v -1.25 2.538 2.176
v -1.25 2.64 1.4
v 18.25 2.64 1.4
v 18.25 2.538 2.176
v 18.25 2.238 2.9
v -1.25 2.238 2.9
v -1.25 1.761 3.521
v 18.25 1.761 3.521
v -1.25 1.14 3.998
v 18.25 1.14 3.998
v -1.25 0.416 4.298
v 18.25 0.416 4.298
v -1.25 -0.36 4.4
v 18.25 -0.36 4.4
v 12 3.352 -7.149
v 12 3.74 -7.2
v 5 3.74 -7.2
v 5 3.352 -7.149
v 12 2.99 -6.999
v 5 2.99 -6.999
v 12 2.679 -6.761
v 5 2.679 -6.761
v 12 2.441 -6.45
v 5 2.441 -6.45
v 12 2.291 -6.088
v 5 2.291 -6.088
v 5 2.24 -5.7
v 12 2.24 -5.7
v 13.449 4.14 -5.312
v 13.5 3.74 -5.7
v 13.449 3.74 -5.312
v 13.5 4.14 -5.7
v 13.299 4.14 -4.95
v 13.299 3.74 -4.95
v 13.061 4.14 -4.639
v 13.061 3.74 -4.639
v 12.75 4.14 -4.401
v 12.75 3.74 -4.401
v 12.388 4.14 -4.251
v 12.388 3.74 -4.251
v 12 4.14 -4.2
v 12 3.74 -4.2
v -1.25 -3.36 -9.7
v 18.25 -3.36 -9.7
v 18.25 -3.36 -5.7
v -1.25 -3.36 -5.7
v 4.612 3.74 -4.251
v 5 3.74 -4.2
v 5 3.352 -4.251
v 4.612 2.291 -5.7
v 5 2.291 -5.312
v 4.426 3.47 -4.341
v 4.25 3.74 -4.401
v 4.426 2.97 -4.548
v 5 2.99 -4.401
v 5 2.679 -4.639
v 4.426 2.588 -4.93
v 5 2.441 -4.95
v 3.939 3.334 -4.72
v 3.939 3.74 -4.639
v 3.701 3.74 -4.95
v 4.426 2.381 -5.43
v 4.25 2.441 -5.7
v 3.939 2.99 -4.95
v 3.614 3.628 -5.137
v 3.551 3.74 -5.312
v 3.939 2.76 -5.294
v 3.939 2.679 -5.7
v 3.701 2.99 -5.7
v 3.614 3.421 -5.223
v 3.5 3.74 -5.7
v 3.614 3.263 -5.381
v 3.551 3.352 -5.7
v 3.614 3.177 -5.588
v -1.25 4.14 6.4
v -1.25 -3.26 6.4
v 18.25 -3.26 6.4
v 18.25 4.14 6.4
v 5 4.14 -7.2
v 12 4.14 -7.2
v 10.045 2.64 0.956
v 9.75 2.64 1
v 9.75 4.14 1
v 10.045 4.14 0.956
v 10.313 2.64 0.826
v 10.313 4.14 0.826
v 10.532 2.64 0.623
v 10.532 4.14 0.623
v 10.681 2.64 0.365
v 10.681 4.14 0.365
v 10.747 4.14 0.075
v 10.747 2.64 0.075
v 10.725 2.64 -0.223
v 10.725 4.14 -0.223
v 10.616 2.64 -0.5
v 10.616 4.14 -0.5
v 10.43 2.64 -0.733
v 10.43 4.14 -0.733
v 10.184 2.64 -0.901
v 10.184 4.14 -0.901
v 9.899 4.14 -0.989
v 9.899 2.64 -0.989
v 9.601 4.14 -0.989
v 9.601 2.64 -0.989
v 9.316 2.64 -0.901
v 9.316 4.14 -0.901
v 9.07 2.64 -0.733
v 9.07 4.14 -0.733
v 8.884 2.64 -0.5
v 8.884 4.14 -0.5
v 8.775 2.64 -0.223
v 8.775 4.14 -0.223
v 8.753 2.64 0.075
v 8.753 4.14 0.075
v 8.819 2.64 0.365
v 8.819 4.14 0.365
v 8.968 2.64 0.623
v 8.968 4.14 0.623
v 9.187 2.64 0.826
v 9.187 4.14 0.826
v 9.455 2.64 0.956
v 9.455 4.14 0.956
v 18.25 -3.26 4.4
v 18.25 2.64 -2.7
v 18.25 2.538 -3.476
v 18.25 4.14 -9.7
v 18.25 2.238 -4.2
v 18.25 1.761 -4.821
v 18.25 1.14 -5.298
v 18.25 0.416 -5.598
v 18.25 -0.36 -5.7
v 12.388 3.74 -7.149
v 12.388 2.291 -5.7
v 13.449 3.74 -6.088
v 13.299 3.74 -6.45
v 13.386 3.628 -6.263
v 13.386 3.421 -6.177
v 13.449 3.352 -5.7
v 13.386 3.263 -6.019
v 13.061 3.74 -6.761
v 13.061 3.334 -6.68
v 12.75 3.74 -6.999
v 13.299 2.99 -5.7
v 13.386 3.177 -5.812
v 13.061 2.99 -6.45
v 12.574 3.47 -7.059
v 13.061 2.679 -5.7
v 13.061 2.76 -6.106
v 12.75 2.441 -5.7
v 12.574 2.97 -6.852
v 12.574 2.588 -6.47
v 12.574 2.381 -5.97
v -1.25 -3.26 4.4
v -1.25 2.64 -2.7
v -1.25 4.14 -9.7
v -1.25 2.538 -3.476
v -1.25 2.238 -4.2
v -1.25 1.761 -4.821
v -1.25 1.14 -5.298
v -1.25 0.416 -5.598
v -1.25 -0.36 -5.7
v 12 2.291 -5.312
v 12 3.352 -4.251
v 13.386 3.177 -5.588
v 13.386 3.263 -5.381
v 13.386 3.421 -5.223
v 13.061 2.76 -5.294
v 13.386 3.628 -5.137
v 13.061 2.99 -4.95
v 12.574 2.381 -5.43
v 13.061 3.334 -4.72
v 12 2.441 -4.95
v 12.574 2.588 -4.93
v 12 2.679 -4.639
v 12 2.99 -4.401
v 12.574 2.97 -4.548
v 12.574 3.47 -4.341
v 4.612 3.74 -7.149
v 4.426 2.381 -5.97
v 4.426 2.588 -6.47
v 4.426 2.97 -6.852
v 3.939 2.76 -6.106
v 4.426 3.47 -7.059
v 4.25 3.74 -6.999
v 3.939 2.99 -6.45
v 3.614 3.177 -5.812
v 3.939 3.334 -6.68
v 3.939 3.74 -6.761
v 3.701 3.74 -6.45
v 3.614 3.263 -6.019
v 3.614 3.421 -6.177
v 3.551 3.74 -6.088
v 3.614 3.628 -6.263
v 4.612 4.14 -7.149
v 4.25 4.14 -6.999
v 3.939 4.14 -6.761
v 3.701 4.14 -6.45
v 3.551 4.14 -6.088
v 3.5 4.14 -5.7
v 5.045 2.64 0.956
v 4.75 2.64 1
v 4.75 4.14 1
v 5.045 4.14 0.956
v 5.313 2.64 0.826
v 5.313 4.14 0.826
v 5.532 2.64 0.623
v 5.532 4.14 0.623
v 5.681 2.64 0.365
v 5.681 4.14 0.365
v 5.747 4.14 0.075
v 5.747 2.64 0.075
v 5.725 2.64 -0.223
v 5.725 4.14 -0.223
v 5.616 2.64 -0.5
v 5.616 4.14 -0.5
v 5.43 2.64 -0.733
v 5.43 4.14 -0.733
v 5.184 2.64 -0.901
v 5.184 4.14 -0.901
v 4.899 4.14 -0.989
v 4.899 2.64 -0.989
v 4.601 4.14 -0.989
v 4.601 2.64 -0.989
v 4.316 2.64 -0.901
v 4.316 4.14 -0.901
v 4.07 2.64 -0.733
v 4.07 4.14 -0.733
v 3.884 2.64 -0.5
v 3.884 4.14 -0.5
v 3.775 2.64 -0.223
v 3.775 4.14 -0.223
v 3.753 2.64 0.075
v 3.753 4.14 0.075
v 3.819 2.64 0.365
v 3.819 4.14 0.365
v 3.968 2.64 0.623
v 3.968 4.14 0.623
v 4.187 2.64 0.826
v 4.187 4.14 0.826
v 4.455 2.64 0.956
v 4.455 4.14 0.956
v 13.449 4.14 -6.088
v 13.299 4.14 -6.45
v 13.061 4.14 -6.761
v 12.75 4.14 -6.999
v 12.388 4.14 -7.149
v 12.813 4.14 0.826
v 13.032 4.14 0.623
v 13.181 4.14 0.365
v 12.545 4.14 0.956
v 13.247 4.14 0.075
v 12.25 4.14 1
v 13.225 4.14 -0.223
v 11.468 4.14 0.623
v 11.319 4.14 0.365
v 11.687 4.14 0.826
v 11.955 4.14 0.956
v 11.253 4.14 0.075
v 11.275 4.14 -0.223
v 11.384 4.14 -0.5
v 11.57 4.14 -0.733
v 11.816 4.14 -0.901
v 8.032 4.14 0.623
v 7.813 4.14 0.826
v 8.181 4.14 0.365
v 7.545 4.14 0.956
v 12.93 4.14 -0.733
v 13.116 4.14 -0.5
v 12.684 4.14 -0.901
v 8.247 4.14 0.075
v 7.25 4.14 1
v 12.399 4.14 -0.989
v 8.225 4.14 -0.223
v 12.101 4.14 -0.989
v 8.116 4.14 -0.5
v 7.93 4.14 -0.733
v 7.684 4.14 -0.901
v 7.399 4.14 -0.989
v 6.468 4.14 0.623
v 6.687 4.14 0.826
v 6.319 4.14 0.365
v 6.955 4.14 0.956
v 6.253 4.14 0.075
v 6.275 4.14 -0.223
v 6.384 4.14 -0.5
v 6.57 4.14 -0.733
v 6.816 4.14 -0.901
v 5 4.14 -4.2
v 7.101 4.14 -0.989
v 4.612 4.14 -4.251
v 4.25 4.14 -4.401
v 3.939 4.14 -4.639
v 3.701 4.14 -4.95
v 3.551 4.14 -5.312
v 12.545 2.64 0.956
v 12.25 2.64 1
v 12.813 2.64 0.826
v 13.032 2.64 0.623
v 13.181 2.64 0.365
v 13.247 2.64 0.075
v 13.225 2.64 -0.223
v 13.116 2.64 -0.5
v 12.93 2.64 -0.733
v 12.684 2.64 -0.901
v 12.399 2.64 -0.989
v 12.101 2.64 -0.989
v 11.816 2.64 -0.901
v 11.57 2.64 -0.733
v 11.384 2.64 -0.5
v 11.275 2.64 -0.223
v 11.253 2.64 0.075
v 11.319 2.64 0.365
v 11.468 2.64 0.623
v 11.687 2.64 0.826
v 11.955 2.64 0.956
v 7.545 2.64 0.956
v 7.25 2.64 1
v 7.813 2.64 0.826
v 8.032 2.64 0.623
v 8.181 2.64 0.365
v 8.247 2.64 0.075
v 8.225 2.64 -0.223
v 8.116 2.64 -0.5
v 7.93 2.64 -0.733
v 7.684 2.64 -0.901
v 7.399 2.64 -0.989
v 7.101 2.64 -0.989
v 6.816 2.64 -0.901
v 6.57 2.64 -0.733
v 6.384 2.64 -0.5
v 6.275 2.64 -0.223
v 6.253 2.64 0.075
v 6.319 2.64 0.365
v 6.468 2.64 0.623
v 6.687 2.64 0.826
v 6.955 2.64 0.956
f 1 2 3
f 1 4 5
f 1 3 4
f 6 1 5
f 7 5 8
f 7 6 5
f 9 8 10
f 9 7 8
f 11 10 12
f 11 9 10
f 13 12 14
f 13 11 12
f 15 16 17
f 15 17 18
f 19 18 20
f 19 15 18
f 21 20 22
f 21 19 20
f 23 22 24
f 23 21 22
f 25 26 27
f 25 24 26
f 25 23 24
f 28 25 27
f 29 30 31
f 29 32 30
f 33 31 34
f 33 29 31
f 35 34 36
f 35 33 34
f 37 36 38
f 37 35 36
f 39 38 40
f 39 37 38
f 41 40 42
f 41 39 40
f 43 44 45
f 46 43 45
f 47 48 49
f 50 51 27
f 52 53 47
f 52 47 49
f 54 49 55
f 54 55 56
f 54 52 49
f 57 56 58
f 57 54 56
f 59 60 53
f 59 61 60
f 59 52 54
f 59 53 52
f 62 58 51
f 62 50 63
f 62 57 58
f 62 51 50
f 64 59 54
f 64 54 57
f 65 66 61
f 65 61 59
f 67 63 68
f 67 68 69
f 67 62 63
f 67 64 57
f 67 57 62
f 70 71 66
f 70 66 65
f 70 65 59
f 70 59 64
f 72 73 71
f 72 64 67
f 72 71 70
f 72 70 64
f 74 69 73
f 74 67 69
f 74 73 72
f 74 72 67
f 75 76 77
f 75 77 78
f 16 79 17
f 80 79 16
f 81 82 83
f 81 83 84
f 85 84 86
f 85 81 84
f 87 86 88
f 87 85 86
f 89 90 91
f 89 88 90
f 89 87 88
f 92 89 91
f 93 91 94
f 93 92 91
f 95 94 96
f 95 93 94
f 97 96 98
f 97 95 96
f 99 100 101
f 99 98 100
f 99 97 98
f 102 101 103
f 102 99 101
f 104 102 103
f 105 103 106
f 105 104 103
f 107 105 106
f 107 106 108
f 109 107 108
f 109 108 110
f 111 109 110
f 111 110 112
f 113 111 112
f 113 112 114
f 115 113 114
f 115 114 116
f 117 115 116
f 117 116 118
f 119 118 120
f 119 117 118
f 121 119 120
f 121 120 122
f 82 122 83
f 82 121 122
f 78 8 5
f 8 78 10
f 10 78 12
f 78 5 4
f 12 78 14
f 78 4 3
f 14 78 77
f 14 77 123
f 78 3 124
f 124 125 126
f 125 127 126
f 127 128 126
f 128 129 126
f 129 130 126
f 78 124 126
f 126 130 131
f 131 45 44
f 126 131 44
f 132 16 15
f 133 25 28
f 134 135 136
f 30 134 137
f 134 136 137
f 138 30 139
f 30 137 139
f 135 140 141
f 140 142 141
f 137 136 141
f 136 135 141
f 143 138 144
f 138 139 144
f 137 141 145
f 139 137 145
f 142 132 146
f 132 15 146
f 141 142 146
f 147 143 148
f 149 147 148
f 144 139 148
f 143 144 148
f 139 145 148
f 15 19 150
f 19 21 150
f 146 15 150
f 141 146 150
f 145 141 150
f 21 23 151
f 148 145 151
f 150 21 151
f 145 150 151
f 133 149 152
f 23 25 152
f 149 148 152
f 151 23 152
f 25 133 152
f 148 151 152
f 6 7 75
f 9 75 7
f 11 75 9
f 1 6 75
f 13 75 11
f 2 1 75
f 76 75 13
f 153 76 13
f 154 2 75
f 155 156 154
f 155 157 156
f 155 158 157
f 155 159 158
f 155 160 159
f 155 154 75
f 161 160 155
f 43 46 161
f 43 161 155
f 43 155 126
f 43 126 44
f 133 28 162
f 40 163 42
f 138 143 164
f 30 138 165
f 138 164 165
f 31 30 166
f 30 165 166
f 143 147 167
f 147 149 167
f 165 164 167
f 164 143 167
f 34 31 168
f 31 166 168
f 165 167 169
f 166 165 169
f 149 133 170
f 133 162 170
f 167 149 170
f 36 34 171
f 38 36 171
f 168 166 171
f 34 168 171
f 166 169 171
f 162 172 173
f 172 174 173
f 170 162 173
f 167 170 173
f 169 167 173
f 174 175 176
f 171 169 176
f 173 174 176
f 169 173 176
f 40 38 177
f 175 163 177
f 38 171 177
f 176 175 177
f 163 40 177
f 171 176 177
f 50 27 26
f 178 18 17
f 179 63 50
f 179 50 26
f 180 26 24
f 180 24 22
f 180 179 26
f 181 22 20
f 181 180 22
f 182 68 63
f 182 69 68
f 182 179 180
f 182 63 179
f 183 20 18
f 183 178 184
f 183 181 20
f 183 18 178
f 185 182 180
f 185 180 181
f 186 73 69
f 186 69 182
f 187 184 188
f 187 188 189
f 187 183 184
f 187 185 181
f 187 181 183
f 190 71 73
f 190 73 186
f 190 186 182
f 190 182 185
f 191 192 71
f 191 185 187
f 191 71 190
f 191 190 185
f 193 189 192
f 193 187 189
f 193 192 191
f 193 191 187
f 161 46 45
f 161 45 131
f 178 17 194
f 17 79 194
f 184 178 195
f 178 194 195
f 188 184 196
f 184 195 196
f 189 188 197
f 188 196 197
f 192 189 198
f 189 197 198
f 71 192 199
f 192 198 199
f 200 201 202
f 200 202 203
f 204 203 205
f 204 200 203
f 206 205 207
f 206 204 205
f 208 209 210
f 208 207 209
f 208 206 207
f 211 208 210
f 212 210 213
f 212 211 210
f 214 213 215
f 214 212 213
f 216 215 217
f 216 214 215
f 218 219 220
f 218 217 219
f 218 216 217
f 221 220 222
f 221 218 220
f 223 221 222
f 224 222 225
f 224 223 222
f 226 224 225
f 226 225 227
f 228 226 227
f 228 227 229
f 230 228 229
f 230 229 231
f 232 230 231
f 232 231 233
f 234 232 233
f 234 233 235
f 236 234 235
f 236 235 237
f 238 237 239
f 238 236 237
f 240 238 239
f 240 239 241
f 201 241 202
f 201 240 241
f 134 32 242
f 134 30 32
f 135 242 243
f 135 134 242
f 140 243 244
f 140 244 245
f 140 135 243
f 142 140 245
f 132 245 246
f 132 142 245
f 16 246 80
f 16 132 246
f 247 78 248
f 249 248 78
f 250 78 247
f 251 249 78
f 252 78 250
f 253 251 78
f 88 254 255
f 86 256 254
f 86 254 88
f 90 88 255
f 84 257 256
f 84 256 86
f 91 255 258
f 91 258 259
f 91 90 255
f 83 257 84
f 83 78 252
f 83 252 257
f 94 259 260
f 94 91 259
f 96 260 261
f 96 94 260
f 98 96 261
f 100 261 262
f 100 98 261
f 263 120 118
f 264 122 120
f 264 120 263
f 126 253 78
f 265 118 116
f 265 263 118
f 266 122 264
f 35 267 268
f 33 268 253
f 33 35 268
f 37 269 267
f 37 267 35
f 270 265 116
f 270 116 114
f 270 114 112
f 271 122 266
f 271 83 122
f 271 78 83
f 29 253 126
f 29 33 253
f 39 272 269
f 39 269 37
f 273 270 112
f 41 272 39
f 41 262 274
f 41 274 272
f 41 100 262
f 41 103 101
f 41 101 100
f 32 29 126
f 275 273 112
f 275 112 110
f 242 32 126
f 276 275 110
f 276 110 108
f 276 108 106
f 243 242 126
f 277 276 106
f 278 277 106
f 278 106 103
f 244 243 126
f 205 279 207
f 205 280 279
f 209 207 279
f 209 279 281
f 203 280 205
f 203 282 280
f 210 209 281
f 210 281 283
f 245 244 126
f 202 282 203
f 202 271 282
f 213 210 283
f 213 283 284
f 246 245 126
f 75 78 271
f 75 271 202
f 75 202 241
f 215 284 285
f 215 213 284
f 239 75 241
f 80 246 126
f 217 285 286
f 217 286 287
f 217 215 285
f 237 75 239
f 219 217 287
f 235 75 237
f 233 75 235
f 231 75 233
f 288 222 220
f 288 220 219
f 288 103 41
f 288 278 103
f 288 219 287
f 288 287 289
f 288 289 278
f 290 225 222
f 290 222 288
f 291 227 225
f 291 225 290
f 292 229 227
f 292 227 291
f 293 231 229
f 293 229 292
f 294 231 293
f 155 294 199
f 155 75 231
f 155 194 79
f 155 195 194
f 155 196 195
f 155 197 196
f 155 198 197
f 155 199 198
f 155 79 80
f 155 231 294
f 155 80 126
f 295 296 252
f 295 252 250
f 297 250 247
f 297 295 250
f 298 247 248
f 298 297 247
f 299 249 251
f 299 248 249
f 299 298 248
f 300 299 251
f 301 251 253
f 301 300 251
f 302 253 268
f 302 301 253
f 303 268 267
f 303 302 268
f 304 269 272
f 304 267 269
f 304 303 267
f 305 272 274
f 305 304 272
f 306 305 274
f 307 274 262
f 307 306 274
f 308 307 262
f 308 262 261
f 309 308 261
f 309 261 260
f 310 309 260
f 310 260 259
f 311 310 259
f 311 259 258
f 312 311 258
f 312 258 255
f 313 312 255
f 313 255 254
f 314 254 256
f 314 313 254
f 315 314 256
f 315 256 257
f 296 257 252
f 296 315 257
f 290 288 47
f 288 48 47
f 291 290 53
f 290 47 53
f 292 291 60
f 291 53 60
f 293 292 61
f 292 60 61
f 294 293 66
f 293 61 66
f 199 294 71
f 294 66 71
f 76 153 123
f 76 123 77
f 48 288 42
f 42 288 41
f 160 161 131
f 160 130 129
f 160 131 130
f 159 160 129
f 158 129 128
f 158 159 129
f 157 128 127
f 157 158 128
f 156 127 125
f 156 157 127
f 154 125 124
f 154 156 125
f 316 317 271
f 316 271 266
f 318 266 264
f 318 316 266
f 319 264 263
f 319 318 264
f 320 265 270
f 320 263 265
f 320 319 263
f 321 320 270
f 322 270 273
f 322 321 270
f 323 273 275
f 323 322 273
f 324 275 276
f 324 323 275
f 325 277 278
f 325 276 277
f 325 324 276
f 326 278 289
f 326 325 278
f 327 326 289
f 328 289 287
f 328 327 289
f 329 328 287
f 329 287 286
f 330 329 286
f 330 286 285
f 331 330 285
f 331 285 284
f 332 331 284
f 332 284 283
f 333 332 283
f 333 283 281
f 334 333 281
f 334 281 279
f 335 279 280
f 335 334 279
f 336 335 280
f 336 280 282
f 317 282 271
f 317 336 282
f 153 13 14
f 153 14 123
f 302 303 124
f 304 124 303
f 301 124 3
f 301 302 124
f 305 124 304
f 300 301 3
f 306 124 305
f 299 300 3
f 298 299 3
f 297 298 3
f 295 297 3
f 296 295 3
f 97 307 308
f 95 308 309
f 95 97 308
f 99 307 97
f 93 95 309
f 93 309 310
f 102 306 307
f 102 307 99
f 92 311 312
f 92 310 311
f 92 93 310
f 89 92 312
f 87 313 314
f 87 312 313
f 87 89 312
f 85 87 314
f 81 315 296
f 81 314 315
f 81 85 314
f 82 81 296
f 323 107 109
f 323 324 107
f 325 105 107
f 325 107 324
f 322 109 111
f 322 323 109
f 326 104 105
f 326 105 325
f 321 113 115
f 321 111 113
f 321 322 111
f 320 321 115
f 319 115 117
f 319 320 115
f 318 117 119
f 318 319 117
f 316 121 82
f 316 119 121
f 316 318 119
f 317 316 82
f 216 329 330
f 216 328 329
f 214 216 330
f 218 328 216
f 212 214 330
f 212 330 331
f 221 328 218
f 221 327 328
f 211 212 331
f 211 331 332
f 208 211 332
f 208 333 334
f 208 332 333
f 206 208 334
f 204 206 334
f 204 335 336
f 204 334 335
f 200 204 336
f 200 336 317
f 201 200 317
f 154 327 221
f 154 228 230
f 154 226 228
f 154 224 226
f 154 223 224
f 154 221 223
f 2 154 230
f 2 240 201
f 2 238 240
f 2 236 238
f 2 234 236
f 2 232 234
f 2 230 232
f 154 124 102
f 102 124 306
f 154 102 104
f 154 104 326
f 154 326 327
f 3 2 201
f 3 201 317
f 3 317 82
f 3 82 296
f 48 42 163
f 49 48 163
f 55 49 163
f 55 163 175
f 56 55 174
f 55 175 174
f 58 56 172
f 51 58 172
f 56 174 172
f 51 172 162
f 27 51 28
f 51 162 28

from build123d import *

# Parameters (mm, degrees)
BOSS_EXTRUDE1_DEPTH      = 4.44
BOSS_EXTRUDE1_DEPTH_BACK = 6
SKETCH21_W               = 19.5
SKETCH21_H               = 24
CUT_EXTRUDE2_DEPTH       = 24.71192527
CUT_EXTRUDE2_DEPTH_BACK  = 24.71192527
SKETCH14_R               = 1
CUT_EXTRUDE4_DEPTH       = 23.650882985
CUT_EXTRUDE4_DEPTH_BACK  = 23.650882985
SKETCH20_W               = 31.709739698
SKETCH20_H               = 13.674781638
SKETCH23_W               = 10
SKETCH23_H               = 3
CUT_EXTRUDE5_DEPTH       = 1.9
FILLET1_R                = 1.5
FILLET2_R                = 1.5


with BuildPart() as part:
    # Sketch21 → Boss-Extrude1 (new, two sides: drawn at the far end of the back side and taken through both)
    with BuildSketch(Plane(origin=(0, 0, 0), x_dir=(1, 0, 0), z_dir=(0, 1, 0)).offset(-BOSS_EXTRUDE1_DEPTH_BACK)):
        with Locations((8.5, 0)):
            Rectangle(SKETCH21_W, SKETCH21_H)
    extrude(amount=BOSS_EXTRUDE1_DEPTH + BOSS_EXTRUDE1_DEPTH_BACK)

    # Sketch14 → Cut-Extrude2 (cut, two sides: drawn at the far end of the back side and taken through both)
    with BuildSketch(Plane(origin=(0, 3.23, 0), x_dir=(1, 0, 0), z_dir=(0, 1, 0)).offset(-CUT_EXTRUDE2_DEPTH_BACK)):
        with Locations(Location((4.75, 0, 0), (0, 0, 270))):
            Circle(SKETCH14_R)
        with Locations(Location((7.25, 0, 0), (0, 0, 270))):
            Circle(SKETCH14_R)
        with Locations(Location((9.75, 0, 0), (0, 0, 270))):
            Circle(SKETCH14_R)
        with Locations(Location((12.25, 0, 0), (0, 0, 270))):
            Circle(SKETCH14_R)
    extrude(amount=CUT_EXTRUDE2_DEPTH + CUT_EXTRUDE2_DEPTH_BACK, mode=Mode.SUBTRACT)

    # Sketch20 → Cut-Extrude4 (cut, two sides: drawn at the far end of the back side and taken through both)
    with BuildSketch(Plane(origin=(0, 0, 0), x_dir=(0, 0, -1), z_dir=(1, 0, 0)).offset(-CUT_EXTRUDE4_DEPTH_BACK)):
        with Locations((-0.27698472, -0.290016026)):
            Rectangle(SKETCH20_W, SKETCH20_H)
        with BuildLine():
            Line((-4.4, -0.36), (-4.4, -3.26))
            Line((-4.4, -3.26), (-6.4, -3.26))
            Line((-6.4, -3.26), (-6.4, 4.14))
            Line((-6.4, 4.14), (9.7, 4.14))
            Line((9.7, 4.14), (9.7, -3.36))
            Line((9.7, -3.36), (5.7, -3.36))
            Line((5.7, -3.36), (5.7, -0.36))
            ThreePointArc((5.7, -0.36), (4.821320344, 1.761320344), (2.7, 2.64))
            Line((2.7, 2.64), (0, 2.64))
            Line((0, 2.64), (-1.4, 2.64))
            ThreePointArc((-1.4, 2.64), (-3.521320344, 1.761320344), (-4.4, -0.36))
        make_face(mode=Mode.SUBTRACT)
    extrude(amount=CUT_EXTRUDE4_DEPTH + CUT_EXTRUDE4_DEPTH_BACK, mode=Mode.SUBTRACT)

    # Sketch23 → Cut-Extrude5 (cut)
    with BuildSketch(Plane(origin=(0, 4.14, 0), x_dir=(1, 0, 0), z_dir=(0, 1, 0))):
        with Locations((8.5, 5.7)):
            Rectangle(SKETCH23_W, SKETCH23_H)
    extrude(amount=-CUT_EXTRUDE5_DEPTH, mode=Mode.SUBTRACT)

    # Fillet1
    fillet1_edges = [part.edges().sort_by_distance(p)[0] for p in [
        (8.5, 2.24, -7.2),
        (8.5, 2.24, -4.2),
    ]]
    fillet(fillet1_edges, radius=FILLET1_R - 0.0001)  # a hair under: the kernel refuses the full size

    # Fillet2
    fillet2_edges = [part.edges().sort_by_distance(p)[0] for p in [
        (3.5, 3.93995, -4.2),
        (3.5, 3.93995, -7.2),
        (3.5, 2.679310539, -6.760689461),
        (13.5, 3.93995, -7.2),
        (13.5, 3.93995, -4.2),
        (13.5, 2.679310539, -4.639310539),
        (3.5, 2.679310539, -4.639310539),
        (13.5, 2.679310539, -6.760689461),
    ]]
    fillet(fillet2_edges, radius=FILLET2_R - 0.0001)  # a hair under: the kernel refuses the full size


solid = part.part
